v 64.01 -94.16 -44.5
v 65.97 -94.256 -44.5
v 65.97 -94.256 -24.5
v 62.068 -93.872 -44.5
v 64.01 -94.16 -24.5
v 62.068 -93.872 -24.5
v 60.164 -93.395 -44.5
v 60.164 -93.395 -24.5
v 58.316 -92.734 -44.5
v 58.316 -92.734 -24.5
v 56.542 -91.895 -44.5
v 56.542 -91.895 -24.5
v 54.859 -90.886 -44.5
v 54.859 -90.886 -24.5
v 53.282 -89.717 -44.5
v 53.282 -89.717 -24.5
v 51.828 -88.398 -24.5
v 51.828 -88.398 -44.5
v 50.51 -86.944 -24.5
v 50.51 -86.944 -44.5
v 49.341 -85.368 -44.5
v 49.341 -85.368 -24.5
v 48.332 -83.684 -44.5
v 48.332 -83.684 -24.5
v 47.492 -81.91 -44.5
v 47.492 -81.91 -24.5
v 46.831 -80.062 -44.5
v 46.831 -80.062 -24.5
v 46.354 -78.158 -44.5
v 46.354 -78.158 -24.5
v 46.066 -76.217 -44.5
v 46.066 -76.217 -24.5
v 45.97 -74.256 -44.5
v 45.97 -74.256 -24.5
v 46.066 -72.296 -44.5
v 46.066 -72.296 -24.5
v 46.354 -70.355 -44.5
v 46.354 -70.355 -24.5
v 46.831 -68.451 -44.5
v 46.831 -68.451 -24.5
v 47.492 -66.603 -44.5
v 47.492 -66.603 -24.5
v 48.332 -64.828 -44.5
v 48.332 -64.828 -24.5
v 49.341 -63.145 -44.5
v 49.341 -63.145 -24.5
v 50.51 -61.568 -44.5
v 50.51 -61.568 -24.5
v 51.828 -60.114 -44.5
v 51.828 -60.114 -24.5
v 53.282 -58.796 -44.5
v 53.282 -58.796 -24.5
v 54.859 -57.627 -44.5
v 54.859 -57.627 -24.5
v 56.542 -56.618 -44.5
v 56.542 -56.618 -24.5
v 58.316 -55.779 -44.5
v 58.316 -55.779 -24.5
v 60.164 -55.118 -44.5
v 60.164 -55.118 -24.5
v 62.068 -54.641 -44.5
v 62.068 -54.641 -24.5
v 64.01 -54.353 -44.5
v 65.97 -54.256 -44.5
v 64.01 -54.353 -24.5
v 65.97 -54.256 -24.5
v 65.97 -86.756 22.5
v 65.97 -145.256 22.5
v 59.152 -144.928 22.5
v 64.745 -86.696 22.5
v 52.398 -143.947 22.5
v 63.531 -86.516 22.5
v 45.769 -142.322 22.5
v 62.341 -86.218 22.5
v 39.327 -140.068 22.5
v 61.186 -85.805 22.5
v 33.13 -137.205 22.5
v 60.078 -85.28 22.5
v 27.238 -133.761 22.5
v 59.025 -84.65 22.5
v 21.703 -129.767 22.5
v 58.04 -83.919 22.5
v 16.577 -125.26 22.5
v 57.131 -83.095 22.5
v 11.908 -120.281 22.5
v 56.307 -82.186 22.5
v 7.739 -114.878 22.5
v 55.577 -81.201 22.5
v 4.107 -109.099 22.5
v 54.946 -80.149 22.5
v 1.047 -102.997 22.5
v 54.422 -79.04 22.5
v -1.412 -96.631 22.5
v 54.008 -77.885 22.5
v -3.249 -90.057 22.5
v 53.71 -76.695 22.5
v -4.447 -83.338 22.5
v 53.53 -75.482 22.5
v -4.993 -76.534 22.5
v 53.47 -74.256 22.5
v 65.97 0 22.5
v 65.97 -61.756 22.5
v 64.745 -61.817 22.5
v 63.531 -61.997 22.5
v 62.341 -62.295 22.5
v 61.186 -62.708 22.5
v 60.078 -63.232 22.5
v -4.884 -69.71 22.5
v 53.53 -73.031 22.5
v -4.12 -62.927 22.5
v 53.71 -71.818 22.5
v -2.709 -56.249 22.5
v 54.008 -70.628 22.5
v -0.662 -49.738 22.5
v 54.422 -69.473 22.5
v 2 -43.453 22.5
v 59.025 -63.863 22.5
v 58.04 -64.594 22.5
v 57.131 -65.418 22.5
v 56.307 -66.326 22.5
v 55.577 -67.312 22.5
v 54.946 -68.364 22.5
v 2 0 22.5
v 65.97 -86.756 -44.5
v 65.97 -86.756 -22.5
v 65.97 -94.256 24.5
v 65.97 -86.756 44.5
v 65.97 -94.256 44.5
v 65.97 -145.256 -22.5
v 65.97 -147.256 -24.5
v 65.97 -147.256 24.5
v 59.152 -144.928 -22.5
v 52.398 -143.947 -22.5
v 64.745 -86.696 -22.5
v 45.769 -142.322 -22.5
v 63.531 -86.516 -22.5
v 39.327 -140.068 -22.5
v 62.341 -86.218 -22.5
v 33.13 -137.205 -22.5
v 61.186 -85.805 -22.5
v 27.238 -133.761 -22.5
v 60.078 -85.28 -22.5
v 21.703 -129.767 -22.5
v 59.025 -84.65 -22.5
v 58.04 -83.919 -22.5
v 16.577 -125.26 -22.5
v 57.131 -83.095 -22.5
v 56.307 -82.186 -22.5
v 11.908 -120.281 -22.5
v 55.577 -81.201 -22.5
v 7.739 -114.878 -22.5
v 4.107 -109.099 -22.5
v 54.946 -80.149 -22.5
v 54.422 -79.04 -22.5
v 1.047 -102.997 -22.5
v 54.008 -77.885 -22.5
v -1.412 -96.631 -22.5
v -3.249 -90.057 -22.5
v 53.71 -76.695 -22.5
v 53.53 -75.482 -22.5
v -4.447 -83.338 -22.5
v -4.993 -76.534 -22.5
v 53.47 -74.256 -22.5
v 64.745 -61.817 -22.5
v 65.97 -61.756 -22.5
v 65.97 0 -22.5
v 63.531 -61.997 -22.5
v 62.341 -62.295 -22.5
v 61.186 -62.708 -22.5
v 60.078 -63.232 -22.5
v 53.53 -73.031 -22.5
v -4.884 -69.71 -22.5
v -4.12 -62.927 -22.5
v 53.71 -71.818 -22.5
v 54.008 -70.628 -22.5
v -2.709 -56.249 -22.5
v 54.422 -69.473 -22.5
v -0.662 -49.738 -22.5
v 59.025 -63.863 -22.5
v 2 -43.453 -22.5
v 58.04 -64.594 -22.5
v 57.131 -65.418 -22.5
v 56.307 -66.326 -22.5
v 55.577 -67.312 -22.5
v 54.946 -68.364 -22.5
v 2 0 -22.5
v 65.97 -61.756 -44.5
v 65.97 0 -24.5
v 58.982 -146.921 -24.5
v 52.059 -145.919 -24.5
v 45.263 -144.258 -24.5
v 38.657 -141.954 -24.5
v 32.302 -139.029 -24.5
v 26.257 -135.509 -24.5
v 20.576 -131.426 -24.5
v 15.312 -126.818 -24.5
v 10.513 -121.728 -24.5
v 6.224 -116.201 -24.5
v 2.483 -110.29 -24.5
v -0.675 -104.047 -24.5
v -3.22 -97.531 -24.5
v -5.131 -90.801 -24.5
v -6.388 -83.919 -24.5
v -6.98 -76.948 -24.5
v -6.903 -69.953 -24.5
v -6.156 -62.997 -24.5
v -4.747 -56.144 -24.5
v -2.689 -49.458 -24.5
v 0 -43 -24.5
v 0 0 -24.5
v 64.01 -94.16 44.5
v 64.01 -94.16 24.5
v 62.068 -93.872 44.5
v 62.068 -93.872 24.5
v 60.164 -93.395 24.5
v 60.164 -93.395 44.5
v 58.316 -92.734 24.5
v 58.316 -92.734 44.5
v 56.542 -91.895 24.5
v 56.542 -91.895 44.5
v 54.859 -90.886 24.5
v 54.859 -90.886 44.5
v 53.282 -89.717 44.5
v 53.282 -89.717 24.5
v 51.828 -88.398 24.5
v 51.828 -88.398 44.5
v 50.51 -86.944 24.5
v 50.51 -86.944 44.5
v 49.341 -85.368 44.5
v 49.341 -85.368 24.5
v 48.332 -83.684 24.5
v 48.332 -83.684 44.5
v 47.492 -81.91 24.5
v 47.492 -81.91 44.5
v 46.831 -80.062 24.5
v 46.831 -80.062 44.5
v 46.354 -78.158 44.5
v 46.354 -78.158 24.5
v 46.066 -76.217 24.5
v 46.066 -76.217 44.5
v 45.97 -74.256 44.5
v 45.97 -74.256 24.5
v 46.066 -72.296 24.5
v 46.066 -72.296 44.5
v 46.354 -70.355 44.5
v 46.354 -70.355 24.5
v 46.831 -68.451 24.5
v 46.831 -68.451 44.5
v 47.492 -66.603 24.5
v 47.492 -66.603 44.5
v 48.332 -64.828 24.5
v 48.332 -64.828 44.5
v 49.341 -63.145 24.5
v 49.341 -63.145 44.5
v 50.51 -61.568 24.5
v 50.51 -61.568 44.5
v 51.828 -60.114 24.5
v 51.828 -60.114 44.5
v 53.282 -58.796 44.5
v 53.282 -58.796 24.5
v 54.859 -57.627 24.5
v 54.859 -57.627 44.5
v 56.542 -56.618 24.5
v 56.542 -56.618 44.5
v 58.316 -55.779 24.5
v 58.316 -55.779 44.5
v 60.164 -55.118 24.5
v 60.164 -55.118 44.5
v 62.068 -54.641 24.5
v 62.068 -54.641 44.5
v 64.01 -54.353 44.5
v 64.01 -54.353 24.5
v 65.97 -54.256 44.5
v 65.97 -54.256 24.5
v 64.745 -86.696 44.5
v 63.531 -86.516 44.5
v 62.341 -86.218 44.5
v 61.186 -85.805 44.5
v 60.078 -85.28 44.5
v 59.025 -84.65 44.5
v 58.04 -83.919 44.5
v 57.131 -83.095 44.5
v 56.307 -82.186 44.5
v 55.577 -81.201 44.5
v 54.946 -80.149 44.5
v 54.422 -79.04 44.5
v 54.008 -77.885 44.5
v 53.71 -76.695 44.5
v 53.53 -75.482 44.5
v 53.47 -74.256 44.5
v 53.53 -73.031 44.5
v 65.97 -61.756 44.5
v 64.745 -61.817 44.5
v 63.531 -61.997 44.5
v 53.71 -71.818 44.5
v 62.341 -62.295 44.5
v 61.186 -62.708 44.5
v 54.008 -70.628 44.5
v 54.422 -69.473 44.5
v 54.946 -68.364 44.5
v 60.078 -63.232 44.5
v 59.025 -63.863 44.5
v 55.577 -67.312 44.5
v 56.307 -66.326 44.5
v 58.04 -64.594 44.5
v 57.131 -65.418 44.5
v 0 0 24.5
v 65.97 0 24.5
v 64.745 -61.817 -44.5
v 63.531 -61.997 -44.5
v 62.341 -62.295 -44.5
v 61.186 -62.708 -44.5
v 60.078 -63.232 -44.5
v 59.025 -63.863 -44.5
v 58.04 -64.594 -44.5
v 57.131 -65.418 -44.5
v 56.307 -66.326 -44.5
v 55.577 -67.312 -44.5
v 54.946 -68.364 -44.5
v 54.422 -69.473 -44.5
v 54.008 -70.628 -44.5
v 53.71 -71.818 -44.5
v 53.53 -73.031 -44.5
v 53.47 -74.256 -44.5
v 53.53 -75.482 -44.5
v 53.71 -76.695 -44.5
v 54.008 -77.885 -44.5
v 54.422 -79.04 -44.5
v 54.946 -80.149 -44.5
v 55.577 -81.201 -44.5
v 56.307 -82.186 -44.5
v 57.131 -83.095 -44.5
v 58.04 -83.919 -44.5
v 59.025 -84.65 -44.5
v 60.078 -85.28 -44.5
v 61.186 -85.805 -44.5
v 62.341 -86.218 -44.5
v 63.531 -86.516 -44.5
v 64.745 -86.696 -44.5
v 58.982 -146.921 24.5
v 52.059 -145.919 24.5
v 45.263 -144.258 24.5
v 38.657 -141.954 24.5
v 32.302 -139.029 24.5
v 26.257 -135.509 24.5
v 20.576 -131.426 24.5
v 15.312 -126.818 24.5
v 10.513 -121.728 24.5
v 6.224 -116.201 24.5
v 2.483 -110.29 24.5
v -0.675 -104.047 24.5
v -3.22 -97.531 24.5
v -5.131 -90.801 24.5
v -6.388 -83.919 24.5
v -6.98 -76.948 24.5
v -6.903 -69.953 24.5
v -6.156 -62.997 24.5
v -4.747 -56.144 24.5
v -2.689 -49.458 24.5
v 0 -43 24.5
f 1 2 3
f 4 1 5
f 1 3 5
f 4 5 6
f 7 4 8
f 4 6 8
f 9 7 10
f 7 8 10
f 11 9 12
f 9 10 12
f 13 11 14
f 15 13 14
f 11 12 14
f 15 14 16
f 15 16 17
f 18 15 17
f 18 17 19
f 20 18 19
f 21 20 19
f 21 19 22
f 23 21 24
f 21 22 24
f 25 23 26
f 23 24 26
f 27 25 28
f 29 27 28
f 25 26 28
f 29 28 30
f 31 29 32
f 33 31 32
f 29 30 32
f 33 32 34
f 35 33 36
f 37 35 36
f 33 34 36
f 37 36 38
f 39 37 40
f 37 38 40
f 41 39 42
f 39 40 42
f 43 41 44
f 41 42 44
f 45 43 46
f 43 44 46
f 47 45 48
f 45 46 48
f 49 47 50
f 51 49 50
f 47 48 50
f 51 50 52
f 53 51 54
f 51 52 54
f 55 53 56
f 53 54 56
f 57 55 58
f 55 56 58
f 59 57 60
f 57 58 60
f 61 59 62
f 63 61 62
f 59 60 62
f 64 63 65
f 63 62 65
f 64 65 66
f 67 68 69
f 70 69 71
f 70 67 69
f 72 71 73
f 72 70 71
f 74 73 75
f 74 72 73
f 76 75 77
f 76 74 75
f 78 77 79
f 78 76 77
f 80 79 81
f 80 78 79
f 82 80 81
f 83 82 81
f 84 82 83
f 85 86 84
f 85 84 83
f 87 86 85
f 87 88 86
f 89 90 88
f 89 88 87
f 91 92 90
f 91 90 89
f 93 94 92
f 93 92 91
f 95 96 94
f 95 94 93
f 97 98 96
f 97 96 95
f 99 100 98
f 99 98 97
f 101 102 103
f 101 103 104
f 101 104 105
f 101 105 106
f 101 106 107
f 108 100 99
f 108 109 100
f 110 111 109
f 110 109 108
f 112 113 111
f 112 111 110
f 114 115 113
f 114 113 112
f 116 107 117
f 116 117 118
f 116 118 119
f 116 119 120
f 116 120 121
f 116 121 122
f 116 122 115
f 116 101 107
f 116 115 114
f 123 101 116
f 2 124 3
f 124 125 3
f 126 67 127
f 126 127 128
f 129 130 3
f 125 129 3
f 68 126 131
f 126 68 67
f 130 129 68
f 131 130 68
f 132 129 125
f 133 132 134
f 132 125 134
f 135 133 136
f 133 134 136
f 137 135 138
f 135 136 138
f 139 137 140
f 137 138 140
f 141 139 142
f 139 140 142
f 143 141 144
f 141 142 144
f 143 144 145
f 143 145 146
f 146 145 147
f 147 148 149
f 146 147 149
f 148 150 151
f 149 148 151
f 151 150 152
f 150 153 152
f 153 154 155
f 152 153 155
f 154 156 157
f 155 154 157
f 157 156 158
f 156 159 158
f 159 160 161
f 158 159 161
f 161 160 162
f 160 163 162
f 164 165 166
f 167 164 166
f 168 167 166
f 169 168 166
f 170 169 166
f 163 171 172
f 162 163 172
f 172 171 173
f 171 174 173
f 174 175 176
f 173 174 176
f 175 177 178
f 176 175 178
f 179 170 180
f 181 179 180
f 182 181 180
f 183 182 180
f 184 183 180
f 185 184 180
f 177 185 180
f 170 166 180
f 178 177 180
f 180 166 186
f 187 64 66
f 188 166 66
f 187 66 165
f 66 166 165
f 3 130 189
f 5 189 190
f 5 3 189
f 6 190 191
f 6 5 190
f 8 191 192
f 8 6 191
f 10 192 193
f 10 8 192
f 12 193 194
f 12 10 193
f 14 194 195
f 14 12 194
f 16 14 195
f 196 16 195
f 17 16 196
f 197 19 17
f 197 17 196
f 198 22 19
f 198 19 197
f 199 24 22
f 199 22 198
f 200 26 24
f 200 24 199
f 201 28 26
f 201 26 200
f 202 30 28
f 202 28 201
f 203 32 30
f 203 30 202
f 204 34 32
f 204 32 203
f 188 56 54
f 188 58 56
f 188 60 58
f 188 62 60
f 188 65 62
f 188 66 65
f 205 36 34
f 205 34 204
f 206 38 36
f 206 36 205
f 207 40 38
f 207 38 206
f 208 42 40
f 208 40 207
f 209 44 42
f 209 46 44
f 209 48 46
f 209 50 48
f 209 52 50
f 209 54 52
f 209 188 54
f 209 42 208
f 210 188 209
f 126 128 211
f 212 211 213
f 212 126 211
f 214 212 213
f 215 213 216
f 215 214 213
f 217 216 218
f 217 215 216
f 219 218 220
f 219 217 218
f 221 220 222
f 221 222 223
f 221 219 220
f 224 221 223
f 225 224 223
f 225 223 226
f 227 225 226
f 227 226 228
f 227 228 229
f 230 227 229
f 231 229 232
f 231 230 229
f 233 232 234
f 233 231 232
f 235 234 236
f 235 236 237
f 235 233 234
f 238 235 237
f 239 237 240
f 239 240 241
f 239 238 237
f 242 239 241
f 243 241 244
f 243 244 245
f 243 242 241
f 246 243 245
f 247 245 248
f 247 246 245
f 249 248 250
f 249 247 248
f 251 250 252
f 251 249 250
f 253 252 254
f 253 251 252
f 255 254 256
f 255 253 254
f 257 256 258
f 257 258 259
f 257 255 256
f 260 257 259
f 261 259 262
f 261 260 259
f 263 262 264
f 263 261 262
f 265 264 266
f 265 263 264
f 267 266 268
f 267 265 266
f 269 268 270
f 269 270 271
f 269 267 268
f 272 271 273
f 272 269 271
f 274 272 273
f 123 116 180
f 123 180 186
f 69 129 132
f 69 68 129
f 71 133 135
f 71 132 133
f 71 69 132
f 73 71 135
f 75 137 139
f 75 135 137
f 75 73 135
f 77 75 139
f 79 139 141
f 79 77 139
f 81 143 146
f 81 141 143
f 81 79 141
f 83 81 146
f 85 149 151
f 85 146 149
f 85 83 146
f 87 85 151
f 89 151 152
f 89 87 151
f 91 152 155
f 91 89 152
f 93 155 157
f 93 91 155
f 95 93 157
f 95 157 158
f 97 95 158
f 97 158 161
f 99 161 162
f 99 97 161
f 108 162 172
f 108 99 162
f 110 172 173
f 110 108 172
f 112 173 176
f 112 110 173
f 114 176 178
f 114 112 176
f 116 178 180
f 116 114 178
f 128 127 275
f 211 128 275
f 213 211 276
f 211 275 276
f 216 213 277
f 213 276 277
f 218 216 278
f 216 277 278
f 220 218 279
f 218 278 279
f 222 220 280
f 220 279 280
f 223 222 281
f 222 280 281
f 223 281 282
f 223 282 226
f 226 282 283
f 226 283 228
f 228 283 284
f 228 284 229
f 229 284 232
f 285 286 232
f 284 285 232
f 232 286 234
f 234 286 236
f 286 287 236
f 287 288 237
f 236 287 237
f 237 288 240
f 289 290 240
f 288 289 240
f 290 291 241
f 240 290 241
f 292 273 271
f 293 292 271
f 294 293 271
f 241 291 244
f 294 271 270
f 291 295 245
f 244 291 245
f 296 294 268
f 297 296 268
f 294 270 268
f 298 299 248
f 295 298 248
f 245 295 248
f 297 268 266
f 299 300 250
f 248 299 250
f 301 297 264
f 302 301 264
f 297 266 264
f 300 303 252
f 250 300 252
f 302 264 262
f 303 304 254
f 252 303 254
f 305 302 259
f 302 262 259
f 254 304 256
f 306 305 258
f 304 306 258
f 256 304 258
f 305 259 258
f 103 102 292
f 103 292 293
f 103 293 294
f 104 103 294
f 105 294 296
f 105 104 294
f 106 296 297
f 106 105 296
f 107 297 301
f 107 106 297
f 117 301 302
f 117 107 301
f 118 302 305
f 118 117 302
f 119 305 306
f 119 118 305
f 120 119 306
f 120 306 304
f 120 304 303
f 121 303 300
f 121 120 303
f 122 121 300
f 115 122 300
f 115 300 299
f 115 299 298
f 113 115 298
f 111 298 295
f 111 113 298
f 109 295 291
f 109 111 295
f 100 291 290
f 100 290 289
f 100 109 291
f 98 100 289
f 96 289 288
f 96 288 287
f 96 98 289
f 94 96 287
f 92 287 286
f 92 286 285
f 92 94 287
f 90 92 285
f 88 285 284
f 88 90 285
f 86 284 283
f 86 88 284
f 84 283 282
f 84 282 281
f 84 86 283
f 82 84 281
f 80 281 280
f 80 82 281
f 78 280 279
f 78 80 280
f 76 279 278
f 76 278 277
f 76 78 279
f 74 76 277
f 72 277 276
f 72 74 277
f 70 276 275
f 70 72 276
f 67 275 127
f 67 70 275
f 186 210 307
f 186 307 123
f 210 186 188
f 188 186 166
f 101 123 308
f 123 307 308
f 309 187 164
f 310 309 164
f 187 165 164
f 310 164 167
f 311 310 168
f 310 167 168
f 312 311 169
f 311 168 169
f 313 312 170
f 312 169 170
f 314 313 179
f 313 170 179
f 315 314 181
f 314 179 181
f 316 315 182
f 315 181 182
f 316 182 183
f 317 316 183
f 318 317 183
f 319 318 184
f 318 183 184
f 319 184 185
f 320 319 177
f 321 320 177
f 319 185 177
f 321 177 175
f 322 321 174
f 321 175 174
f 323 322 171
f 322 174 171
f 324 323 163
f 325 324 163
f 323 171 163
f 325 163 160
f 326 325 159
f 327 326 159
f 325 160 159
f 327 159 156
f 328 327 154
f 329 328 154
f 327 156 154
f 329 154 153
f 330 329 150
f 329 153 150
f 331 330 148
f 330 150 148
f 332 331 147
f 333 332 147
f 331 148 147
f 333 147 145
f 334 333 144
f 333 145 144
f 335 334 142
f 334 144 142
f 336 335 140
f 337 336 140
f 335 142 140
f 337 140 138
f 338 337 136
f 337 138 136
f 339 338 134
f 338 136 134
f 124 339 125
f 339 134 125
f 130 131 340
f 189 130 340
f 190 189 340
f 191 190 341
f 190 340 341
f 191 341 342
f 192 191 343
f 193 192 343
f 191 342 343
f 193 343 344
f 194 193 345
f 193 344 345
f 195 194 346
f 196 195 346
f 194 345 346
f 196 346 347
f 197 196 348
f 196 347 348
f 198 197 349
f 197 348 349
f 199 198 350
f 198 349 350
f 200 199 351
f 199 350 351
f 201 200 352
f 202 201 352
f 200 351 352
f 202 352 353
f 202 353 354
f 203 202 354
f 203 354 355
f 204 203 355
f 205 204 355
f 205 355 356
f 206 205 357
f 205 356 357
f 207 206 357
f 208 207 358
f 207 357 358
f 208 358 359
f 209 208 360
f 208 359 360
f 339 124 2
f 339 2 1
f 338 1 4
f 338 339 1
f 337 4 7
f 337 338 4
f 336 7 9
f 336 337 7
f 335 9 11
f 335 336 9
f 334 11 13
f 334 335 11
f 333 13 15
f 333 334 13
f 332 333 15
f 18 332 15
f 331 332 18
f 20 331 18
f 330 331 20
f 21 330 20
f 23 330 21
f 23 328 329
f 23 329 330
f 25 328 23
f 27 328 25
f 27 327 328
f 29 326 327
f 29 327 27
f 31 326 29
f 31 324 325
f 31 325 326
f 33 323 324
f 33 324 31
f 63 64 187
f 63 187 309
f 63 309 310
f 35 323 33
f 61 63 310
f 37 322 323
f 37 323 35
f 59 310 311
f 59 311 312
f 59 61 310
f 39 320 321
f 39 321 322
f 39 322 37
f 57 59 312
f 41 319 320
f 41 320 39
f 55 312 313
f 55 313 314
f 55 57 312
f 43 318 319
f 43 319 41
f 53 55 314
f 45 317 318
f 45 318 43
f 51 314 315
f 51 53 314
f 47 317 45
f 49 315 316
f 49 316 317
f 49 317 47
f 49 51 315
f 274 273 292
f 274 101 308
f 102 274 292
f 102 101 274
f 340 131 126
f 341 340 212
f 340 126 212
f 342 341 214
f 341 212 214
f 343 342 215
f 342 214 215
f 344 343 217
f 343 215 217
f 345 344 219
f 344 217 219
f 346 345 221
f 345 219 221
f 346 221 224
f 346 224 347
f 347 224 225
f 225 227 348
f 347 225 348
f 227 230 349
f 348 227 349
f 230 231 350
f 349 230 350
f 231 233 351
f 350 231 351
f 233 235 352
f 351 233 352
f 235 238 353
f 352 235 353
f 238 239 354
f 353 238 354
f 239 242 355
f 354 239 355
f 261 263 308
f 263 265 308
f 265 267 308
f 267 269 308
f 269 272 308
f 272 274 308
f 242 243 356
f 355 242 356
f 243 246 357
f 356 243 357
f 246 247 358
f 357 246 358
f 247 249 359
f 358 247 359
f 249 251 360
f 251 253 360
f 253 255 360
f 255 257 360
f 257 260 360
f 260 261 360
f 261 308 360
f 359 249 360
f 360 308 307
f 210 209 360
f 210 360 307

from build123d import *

# Parameters (mm, degrees)
BOSS_EXTRUDE1_DEPTH = 24.5
SHELL1_T            = -2
BOSS_EXTRUDE2_DEPTH = 20


with BuildPart() as part:
    # Sketch1 → Boss-Extrude1 (new body, symmetric)
    with BuildSketch(Plane.XY):
        with BuildLine():
            Line((0, 0), (65.97, 0))
            Line((65.97, 0), (65.97, -61.756344956))
            ThreePointArc((65.97, -61.756344956), (53.47, -74.256344956), (65.97, -86.756344956))
            Line((65.97, -86.756344956), (65.97, -147.256344956))
            ThreePointArc((65.97, -147.256344956), (4.282427581, -113.290220104), (0, -43))
            Line((0, -43), (0, 0))
        make_face()
    extrude(amount=BOSS_EXTRUDE1_DEPTH, both=True)

    # Shell1
    shell1_openings = [part.faces().sort_by_distance(p)[0] for p in [
        (32.985, 0, 0),
        (65.97, -30.878172478, 0),
        (59.72, -74.256344956, 0),
        (65.97, -117.006344956, 0),
    ]]
    offset(amount=SHELL1_T, openings=shell1_openings, kind=Kind.INTERSECTION)

    # Sketch2 → Boss-Extrude2 (add)
    with BuildSketch(Plane.XY.offset(24.5)):
        with BuildLine():
            Line((65.97, -54.256344956), (65.97, -61.756344956))
            ThreePointArc((65.97, -61.756344956), (53.47, -74.256344956), (65.97, -86.756344956))
            Line((65.97, -86.756344956), (65.97, -94.256344956))
            ThreePointArc((65.97, -94.256344956), (45.97, -74.256344956), (65.97, -54.256344956))
        make_face()
    boss_extrude2 = extrude(amount=BOSS_EXTRUDE2_DEPTH)

    # Mirror1: Boss-Extrude2 across plane
    add(boss_extrude2.mirror(Plane.XY))


solid = part.part
